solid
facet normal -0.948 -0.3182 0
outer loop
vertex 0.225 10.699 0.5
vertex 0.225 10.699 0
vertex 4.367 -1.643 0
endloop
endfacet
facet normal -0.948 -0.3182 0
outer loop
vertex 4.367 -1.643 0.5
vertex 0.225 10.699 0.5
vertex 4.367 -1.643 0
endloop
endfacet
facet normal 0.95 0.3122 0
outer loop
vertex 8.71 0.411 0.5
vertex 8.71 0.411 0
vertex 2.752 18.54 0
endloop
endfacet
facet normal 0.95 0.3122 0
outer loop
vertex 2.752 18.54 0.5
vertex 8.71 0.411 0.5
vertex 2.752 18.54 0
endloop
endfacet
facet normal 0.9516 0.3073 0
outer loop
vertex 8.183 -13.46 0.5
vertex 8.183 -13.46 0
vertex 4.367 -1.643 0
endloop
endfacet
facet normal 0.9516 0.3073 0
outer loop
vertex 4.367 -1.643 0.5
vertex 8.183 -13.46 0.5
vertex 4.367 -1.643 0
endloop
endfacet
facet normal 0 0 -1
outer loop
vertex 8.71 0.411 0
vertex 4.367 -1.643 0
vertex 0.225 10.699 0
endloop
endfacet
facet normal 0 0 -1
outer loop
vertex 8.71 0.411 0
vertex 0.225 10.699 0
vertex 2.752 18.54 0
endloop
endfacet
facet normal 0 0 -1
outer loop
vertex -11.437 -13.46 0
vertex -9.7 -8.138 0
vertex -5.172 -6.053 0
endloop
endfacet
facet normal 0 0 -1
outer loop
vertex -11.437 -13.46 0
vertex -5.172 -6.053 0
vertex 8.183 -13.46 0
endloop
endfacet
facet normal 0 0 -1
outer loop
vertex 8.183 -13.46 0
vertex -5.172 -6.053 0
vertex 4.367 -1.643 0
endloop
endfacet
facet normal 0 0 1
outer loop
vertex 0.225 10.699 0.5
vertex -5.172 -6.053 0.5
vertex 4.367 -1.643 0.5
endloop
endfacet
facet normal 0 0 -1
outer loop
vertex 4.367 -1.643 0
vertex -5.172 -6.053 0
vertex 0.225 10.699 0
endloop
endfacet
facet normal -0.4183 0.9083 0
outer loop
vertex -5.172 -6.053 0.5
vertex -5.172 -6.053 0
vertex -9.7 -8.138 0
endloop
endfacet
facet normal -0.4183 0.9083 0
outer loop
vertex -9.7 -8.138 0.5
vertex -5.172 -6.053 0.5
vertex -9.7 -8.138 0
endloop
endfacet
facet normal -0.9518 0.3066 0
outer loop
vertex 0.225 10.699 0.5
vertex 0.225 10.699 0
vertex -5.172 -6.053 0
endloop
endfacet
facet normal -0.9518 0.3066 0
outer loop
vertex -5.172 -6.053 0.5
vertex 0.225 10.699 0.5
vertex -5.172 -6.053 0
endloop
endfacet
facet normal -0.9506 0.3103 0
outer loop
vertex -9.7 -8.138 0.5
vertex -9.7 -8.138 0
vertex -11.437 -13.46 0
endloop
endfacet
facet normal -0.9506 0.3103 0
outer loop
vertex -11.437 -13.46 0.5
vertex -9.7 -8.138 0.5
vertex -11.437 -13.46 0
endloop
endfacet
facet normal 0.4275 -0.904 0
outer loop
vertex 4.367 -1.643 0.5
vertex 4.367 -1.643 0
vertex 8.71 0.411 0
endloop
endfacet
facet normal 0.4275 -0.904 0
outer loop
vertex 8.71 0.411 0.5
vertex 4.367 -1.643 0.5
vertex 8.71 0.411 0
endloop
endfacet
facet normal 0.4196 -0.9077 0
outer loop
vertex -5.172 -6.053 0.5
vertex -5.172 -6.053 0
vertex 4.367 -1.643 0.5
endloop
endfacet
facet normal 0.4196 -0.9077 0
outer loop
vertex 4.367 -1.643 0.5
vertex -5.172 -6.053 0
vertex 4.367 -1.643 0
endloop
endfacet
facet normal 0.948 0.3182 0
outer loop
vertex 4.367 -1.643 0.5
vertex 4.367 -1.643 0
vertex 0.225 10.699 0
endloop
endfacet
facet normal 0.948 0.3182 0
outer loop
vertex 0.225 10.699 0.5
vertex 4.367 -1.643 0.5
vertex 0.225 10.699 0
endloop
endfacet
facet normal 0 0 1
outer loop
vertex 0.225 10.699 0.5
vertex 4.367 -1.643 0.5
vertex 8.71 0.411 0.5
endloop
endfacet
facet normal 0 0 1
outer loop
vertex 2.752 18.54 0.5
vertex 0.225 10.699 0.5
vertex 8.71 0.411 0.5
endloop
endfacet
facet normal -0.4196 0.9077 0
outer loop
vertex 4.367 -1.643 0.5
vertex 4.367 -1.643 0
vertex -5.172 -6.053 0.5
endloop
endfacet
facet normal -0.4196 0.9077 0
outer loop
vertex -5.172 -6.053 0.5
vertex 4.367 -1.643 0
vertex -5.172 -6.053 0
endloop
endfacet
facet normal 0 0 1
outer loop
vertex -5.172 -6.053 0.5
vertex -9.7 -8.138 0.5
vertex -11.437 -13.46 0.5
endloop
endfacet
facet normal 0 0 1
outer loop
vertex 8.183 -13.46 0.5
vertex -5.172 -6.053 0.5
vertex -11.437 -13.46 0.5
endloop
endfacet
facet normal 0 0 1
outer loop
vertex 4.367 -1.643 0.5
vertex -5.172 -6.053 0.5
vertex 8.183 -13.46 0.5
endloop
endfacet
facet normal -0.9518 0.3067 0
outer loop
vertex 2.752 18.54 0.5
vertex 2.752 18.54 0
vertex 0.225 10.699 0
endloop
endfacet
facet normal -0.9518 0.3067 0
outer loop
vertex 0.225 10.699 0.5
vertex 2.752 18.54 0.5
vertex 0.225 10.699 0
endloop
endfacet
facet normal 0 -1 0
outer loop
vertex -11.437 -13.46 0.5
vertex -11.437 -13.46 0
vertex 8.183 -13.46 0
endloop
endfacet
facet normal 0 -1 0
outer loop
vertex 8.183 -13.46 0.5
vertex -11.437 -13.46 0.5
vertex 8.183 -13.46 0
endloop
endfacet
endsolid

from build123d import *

# Parameters (mm, degrees)
F1_DEPTH = 0.5
F2_DEPTH = 0.5
F3_DEPTH = 0.5


with BuildPart() as f1:
    # F0 (on Top) → F1 (new body)
    with BuildSketch(Plane.XY):
        Polygon((8.709713, 0.410578), (2.751872, 18.539535), (0.225462, 10.698666), (4.366757, -1.64255), align=None)
    extrude(amount=F1_DEPTH)


with BuildPart() as f2:
    # F0 (on Top) → F2 (new body)
    with BuildSketch(Plane.XY):
        Polygon((4.366757, -1.64255), (0.225462, 10.698666), (-5.172026, -6.052764), align=None)
    extrude(amount=F2_DEPTH)


with BuildPart() as f3:
    # F0 (on Top) → F3 (new body)
    with BuildSketch(Plane.XY):
        Polygon((4.366757, -1.64255), (-5.172026, -6.052764), (-9.699969, -8.138), (-11.436996, -13.460465), (8.182896, -13.460465), align=None)
    extrude(amount=F3_DEPTH)


solid = Compound([f1.part, f2.part, f3.part])
